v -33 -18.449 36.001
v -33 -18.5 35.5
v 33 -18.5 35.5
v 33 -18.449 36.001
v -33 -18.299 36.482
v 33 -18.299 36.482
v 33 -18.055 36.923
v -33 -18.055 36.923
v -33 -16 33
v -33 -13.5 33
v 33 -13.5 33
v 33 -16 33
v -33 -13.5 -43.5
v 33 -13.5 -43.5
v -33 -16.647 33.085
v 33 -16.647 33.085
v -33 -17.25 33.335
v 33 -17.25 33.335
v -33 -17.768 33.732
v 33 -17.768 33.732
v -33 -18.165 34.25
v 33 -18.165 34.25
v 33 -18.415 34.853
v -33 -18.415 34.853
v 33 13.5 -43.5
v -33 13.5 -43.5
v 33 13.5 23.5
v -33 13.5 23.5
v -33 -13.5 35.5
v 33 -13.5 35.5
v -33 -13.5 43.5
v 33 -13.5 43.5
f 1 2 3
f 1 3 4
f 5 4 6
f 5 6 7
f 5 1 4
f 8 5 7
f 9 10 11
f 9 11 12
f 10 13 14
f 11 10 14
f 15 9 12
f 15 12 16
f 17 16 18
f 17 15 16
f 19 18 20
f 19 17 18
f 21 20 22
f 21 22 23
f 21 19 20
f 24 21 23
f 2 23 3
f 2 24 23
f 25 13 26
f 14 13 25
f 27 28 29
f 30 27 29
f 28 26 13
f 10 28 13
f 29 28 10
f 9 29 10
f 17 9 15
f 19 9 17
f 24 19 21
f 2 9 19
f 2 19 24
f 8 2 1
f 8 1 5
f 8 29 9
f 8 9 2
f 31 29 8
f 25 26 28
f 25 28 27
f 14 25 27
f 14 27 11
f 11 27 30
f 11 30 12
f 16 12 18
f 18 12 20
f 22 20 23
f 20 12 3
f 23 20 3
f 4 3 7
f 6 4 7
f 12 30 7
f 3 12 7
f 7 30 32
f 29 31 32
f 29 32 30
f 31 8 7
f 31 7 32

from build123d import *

# Parameters (mm, degrees)
F0_W     = 66
F0_H     = 87
F1_DEPTH = 13.5
F3_DEPTH = 70
F4_DEPTH = 66


with BuildPart() as f1:
    # F0 (on Front) → F1 (new body, symmetric)
    with BuildSketch(Plane.XZ):
        Rectangle(F0_W, F0_H)
    extrude(amount=F1_DEPTH, both=True)

    # F2 (on face) → F3 (cut)
    with BuildSketch(Plane(origin=(-33, 0, 0), x_dir=(0, -1, 0), z_dir=(-1, 0, 0))):
        Polygon((13.5, 35.5), (13.5, 43.5), (-13.5, 43.5), (-13.5, 23.5), align=None)
    extrude(amount=-F3_DEPTH, mode=Mode.SUBTRACT)

    # F2 (on face) → F4 (join)
    with BuildSketch(Plane(origin=(-33, 0, 0), x_dir=(0, -1, 0), z_dir=(-1, 0, 0))):
        with BuildLine():
            ThreePointArc((16, 33), (14.232233047, 33.732233047), (13.5, 35.5))
            Line((13.5, 35.5), (13.5, 33))
            Line((13.5, 33), (16, 33))
        make_face()
        with BuildLine():
            ThreePointArc((18.0551601423, 36.9234875445), (15.2543125172, 37.8861999451), (13.5, 35.5))
            ThreePointArc((13.5, 35.5), (14.232233047, 33.732233047), (16, 33))
            ThreePointArc((16, 33), (17.767766953, 33.732233047), (18.5, 35.5))
            ThreePointArc((18.5, 35.5), (18.3861999451, 36.2456874828), (18.0551601423, 36.9234875445))
        make_face()
        with BuildLine():
            Line((18.0551601423, 36.9234875445), (13.5, 43.5))
            Line((13.5, 43.5), (13.5, 35.5))
            ThreePointArc((13.5, 35.5), (15.2543125172, 37.8861999451), (18.0551601423, 36.9234875445))
        make_face()
    extrude(amount=-F4_DEPTH)


solid = f1.part
